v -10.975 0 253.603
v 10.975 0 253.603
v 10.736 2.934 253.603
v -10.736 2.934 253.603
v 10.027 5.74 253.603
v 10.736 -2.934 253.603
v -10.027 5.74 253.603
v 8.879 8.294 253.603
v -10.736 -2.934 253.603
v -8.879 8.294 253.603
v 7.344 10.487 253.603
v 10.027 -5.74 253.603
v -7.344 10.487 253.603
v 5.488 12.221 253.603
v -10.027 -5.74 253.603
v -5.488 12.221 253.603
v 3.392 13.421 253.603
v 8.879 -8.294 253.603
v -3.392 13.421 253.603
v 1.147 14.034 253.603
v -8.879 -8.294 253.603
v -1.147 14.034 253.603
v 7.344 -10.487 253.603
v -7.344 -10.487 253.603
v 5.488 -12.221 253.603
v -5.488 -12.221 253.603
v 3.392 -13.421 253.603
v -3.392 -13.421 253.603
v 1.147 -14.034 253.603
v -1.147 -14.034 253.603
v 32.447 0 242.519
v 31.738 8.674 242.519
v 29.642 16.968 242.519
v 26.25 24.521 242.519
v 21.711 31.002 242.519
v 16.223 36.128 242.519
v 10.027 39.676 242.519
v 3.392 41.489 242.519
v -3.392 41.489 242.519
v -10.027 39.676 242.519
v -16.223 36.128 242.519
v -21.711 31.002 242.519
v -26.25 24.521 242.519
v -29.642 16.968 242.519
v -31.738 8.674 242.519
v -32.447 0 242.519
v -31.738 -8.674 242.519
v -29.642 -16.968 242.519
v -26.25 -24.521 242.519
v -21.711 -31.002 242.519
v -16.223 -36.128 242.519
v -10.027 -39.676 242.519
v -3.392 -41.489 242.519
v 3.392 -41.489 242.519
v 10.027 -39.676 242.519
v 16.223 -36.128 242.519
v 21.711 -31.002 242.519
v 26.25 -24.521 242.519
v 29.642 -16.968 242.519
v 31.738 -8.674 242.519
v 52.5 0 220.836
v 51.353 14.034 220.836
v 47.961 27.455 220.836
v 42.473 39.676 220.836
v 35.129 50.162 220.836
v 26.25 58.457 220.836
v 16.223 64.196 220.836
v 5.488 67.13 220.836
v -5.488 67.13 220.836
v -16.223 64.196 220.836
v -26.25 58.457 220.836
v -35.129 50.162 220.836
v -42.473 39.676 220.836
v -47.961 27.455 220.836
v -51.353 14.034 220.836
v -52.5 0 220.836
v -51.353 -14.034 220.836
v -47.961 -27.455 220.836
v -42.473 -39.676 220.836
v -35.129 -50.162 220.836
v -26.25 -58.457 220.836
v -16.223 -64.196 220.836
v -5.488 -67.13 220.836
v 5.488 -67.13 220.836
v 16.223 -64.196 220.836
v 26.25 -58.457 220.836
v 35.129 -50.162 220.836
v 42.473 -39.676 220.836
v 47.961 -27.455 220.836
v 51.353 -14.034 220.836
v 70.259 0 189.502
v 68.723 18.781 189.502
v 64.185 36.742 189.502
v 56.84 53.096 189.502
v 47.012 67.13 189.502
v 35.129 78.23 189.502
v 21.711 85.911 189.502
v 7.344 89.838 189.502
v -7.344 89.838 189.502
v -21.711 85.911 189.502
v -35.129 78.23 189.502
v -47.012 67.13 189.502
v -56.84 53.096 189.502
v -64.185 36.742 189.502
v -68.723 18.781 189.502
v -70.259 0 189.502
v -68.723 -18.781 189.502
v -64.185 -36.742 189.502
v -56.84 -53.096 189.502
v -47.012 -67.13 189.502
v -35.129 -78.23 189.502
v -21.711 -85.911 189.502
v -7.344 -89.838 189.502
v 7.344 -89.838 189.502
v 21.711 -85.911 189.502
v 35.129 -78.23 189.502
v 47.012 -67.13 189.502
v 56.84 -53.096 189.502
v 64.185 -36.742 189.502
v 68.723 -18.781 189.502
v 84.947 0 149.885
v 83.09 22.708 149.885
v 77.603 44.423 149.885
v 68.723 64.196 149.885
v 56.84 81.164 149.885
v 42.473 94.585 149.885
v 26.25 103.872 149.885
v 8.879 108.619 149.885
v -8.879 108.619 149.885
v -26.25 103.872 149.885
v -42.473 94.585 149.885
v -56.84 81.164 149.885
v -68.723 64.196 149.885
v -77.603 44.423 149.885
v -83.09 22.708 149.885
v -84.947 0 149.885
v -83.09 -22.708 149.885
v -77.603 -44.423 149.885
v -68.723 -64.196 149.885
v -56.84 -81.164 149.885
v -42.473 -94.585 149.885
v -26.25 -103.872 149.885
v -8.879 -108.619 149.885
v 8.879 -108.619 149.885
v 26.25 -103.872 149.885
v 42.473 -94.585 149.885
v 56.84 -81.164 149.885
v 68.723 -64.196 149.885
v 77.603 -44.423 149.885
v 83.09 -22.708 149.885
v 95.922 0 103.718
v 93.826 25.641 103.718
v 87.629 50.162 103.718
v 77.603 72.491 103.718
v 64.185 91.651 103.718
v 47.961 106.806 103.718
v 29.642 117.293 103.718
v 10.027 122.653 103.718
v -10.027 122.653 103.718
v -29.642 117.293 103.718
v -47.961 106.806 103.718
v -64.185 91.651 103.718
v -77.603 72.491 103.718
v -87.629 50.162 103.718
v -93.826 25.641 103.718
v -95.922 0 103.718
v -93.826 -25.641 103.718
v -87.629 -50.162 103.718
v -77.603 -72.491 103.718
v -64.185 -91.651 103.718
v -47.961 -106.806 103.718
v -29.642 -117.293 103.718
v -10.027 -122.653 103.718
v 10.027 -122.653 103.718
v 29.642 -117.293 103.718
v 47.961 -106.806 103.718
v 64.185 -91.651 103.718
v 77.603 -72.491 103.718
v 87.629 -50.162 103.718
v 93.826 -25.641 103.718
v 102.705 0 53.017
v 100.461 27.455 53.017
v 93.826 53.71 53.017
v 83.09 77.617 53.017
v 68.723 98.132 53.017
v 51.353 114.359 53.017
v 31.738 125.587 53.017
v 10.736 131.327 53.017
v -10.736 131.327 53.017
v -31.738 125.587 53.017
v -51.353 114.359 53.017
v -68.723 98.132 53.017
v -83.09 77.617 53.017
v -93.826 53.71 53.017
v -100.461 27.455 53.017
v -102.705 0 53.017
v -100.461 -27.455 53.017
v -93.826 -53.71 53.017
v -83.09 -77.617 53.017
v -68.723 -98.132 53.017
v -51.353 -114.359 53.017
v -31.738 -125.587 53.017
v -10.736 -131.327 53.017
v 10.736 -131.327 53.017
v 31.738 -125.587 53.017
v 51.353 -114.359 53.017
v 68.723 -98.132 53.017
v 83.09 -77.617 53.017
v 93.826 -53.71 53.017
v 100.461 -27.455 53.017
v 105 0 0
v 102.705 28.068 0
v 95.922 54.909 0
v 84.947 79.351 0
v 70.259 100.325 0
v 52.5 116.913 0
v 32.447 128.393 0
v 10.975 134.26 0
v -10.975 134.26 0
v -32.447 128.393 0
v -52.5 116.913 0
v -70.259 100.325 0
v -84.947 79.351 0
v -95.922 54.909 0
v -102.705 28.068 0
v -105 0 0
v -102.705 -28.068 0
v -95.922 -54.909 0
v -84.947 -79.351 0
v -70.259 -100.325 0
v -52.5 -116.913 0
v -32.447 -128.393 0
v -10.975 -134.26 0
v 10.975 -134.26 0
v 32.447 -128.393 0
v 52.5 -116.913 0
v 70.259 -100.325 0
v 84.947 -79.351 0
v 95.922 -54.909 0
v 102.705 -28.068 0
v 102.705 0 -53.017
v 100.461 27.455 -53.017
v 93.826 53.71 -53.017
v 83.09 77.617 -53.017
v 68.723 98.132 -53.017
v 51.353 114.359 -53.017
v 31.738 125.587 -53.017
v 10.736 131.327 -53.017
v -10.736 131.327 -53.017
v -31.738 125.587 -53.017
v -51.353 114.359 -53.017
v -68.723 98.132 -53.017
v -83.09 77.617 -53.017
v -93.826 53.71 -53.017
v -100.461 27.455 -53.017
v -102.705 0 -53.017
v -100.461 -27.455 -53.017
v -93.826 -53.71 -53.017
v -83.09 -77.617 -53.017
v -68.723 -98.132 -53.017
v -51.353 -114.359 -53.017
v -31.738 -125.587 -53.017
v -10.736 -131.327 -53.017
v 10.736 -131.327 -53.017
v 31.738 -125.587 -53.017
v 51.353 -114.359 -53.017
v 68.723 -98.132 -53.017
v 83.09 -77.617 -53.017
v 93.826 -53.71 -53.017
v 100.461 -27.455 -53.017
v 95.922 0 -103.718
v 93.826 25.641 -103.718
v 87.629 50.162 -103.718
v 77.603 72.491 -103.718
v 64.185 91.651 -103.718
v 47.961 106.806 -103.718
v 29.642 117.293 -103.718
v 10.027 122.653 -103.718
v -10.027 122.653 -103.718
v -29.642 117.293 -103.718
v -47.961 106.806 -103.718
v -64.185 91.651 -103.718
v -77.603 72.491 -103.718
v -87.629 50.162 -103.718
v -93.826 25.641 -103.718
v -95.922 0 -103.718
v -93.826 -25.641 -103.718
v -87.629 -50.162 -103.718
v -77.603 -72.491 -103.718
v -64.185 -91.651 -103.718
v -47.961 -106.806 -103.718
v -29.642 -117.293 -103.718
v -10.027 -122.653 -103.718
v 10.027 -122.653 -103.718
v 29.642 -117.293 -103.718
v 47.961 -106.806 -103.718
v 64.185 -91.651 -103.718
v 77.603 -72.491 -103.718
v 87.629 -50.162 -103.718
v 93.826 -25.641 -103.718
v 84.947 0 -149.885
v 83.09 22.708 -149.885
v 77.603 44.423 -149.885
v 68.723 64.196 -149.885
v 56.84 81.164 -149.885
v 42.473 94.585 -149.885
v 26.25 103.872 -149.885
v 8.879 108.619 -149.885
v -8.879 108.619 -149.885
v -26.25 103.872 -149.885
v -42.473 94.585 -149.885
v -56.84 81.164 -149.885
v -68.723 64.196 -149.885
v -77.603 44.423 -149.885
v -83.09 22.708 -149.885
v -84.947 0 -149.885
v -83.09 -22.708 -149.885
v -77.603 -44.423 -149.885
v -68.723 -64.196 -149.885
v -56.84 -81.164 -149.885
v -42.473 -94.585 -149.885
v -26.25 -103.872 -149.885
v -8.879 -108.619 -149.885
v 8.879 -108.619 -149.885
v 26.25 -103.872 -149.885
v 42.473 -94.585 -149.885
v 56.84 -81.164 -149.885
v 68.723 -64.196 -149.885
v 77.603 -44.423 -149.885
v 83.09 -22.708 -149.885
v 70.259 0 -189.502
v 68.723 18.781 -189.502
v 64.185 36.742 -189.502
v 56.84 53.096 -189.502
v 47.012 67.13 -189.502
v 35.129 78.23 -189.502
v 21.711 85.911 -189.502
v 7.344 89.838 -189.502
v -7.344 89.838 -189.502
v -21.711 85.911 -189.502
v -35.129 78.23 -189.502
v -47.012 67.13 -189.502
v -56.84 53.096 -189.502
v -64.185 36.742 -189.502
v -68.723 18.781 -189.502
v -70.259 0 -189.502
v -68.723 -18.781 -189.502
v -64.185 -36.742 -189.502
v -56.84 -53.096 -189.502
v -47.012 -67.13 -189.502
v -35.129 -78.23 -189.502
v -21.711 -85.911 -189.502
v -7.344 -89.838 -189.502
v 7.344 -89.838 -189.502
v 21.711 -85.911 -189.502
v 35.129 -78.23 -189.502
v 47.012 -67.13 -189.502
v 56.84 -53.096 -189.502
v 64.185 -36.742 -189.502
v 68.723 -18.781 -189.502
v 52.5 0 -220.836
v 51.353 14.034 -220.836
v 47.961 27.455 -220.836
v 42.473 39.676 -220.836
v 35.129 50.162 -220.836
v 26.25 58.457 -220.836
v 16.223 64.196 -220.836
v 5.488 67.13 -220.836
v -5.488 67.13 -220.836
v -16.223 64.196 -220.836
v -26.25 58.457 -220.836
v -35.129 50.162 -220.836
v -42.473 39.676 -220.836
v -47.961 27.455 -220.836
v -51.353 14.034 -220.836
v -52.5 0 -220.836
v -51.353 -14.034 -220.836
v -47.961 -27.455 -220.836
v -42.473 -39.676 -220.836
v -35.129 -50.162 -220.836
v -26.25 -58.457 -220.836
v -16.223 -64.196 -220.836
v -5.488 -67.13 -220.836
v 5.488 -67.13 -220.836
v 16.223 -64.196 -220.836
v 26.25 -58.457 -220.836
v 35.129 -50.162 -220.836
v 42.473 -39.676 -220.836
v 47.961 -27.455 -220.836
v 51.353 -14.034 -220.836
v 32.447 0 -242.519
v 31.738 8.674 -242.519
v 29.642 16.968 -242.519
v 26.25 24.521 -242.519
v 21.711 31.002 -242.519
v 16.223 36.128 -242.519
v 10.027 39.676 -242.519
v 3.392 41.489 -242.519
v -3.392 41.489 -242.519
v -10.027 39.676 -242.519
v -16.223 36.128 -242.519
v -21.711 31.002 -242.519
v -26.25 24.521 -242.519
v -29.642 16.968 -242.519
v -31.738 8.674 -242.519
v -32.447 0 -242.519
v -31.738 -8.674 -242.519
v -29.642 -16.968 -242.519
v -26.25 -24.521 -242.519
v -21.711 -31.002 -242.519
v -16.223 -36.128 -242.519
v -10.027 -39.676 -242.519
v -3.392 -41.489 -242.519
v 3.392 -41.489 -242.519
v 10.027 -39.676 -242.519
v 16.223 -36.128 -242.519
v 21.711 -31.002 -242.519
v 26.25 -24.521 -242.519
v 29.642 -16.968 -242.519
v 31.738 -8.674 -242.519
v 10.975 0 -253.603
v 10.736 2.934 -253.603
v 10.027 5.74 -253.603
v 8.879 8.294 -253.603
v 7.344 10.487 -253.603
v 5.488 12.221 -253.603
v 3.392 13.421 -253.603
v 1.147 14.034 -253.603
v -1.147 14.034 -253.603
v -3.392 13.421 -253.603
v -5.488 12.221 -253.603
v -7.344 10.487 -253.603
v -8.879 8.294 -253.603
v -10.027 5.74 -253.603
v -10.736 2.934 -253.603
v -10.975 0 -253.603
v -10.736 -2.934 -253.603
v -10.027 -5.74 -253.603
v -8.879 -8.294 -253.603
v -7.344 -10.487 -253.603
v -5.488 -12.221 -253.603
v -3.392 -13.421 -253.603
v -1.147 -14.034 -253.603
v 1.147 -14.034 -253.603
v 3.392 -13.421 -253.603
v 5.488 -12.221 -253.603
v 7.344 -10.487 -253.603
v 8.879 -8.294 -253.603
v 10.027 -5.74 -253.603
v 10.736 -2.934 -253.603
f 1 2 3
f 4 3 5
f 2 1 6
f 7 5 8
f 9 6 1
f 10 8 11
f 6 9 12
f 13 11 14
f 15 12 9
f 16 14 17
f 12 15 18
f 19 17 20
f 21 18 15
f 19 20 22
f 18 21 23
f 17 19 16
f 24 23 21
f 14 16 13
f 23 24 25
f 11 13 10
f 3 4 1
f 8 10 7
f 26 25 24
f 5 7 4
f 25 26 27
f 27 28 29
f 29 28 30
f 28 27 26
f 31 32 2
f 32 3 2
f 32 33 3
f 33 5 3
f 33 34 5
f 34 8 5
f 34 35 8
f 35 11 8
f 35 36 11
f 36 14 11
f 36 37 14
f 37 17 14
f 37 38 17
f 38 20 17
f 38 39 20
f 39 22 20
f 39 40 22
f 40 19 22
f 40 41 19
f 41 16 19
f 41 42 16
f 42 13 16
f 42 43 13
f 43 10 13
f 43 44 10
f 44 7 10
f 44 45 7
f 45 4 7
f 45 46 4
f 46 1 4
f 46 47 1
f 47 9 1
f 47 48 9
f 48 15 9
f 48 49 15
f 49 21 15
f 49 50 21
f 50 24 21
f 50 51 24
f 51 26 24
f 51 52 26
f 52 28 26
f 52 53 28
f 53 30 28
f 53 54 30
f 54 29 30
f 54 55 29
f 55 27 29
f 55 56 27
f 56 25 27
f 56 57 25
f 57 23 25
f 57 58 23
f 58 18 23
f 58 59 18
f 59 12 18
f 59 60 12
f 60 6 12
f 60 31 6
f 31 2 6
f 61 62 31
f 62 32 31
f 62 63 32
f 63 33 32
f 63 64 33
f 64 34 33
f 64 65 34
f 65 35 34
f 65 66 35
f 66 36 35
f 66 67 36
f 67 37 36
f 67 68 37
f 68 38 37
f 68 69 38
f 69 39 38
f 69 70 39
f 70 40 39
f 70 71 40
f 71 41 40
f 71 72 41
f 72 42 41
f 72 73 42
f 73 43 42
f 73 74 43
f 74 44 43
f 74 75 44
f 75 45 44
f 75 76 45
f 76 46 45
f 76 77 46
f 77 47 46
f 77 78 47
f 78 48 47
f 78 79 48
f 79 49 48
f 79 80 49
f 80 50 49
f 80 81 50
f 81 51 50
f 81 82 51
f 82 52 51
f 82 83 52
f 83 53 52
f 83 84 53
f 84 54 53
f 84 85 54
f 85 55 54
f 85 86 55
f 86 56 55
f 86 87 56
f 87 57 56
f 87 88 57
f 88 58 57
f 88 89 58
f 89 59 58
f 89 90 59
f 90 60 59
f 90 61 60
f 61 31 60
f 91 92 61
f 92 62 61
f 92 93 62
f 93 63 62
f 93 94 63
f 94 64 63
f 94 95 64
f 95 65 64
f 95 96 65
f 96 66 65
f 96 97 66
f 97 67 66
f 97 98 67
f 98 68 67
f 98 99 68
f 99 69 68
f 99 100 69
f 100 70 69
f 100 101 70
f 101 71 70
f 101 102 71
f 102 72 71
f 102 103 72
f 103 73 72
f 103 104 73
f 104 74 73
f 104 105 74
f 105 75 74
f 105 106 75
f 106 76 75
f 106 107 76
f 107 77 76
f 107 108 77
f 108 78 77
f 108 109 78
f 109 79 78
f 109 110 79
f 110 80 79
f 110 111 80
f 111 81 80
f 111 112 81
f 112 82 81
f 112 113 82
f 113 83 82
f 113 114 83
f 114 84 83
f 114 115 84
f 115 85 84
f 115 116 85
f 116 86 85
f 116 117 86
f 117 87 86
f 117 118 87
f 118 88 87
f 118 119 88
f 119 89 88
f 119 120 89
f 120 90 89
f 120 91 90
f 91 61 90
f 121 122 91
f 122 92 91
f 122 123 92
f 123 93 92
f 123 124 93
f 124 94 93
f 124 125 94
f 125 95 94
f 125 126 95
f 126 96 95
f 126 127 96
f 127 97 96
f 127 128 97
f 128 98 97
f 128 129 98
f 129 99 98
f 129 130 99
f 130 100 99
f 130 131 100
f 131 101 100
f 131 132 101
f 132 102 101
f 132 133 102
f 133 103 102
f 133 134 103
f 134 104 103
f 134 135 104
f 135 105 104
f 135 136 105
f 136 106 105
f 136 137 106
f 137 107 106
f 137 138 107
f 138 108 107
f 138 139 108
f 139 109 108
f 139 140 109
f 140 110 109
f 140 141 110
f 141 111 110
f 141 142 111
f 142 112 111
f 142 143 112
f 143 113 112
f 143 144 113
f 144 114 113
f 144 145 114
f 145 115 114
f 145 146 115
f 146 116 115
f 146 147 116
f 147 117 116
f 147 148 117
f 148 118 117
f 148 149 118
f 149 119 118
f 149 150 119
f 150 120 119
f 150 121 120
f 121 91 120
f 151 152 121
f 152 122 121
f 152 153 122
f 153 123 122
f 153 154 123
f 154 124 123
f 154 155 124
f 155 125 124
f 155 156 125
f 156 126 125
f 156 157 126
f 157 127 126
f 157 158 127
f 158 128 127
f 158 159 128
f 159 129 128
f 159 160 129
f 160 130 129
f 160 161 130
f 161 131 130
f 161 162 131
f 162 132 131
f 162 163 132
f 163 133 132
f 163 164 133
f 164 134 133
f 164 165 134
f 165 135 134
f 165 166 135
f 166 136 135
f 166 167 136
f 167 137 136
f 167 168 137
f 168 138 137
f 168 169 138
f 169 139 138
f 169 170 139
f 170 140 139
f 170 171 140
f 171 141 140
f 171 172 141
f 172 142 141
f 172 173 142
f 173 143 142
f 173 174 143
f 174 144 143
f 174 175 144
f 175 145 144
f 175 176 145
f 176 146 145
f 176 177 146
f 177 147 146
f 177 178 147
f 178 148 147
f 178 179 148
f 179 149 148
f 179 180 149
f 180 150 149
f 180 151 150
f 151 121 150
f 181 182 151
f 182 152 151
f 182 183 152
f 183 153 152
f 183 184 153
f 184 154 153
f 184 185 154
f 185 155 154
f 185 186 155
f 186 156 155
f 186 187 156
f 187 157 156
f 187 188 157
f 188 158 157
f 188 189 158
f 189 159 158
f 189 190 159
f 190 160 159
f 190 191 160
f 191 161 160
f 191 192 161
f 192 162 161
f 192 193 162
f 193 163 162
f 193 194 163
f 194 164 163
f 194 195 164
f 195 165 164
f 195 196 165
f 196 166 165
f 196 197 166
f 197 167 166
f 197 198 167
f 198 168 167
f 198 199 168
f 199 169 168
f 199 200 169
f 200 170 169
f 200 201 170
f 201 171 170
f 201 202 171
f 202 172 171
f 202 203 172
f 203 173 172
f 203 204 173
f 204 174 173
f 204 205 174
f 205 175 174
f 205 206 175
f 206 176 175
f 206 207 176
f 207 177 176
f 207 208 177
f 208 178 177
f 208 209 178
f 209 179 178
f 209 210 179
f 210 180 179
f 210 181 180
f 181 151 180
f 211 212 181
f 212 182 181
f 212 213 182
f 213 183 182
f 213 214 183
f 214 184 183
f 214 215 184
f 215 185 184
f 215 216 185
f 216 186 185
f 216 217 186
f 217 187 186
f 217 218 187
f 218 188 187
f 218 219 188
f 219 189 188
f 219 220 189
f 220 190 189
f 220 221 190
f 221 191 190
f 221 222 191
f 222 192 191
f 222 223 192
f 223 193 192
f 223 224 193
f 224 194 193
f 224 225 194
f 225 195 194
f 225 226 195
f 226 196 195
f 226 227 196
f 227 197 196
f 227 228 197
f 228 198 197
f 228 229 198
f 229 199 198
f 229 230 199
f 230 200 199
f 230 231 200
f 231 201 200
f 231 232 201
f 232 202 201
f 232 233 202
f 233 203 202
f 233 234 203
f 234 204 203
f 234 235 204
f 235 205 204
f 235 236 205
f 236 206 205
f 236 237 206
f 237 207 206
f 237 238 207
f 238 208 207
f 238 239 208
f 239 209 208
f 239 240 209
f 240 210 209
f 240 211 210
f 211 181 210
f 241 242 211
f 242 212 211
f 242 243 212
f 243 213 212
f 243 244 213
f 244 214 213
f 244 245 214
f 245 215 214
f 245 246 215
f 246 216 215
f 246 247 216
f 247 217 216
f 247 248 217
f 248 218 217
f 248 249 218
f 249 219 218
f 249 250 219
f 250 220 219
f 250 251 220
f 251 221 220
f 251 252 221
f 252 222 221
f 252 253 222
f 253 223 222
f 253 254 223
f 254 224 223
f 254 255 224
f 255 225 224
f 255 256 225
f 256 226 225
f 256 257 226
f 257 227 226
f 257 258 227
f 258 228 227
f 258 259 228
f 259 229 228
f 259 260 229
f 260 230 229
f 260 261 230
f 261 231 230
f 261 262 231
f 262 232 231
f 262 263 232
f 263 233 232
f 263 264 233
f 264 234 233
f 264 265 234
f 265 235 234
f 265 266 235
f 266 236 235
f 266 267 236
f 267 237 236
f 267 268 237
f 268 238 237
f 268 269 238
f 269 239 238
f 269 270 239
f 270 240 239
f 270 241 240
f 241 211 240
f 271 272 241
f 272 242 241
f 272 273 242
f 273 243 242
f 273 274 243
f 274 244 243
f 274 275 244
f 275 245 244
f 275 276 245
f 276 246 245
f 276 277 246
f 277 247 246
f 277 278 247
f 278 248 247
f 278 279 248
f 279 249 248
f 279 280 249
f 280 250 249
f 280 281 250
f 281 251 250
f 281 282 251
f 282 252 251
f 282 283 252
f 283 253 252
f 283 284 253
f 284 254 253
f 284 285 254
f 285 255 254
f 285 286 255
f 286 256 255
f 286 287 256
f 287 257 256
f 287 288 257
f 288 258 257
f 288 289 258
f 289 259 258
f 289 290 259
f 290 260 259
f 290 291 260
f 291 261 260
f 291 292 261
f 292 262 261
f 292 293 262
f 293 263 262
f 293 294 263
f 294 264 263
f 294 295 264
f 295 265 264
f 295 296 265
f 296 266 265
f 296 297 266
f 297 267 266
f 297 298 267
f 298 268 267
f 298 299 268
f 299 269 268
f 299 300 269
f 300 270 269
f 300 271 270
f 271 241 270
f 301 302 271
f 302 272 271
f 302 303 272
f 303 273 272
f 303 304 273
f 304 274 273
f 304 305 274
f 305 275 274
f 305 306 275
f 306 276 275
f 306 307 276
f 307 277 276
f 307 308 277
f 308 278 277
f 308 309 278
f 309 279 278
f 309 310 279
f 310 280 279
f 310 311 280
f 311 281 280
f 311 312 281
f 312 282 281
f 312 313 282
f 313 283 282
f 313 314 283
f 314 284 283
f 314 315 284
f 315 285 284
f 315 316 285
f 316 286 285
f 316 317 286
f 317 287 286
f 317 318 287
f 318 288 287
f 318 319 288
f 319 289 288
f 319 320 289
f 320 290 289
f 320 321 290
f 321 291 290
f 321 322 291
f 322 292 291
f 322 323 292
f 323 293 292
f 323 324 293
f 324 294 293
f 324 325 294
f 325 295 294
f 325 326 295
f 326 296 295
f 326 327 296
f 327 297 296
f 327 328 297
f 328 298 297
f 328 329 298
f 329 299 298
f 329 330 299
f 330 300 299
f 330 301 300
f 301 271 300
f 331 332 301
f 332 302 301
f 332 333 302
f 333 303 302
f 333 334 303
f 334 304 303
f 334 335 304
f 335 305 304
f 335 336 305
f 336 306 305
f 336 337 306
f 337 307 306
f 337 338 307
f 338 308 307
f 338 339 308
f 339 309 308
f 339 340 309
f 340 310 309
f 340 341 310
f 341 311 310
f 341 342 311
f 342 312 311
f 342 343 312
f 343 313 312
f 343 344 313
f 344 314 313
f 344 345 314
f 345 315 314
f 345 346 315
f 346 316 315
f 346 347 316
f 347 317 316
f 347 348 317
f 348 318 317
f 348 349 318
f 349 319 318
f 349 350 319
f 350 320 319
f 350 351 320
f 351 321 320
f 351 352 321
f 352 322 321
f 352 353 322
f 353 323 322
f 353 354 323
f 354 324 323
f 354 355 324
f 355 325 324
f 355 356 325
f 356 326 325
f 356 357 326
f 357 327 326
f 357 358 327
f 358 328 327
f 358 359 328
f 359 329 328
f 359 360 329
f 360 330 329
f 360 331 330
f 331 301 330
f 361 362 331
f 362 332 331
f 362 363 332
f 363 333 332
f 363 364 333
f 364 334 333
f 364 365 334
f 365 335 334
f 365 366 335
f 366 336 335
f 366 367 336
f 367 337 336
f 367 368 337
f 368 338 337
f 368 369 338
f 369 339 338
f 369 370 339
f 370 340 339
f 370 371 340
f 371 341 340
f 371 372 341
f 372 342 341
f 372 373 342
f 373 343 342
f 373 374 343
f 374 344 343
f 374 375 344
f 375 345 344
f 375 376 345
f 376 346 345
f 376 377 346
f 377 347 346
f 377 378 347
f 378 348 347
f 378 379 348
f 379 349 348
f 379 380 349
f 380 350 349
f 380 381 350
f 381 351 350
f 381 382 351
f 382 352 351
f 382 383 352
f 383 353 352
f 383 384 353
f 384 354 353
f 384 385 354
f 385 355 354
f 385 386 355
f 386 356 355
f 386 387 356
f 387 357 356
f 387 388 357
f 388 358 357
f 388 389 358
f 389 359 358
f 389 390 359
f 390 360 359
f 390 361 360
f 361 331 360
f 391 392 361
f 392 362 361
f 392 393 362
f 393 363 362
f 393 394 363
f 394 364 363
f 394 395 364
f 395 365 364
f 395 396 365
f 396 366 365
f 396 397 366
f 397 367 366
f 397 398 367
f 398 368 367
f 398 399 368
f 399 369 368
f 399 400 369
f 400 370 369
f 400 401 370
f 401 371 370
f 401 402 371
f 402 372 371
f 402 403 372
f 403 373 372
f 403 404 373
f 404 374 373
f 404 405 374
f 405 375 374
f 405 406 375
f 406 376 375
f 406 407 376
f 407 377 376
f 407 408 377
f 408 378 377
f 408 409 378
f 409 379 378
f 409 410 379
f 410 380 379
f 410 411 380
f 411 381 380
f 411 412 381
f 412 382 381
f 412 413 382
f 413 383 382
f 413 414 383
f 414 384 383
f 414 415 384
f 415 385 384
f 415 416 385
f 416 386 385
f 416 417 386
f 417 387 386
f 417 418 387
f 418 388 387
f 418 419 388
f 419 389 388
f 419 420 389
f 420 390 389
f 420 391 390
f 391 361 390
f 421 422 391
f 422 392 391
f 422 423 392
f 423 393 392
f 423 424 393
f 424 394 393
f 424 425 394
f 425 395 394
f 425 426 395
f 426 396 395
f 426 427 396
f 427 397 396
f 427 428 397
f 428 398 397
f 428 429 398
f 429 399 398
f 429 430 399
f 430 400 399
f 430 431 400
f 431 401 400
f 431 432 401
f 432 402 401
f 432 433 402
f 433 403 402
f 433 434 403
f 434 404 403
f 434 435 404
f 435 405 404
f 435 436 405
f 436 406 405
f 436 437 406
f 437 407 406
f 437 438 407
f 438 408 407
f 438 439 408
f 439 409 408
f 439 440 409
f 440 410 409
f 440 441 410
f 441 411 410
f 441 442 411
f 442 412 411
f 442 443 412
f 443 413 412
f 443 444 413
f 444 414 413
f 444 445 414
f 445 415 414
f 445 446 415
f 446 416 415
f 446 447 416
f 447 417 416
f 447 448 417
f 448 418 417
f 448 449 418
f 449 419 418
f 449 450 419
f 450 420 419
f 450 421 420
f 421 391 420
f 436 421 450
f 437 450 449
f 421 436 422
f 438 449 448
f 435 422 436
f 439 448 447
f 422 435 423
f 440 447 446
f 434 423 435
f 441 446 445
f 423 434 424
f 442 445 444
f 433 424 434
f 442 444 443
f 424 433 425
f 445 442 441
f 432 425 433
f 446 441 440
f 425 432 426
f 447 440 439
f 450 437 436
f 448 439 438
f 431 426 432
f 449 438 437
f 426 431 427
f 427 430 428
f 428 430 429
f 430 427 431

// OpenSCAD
// Generated by SolidPython 1.0.1 on 2020-07-29 00:46:47


scale(v = [7, 9, 17]) {
	sphere(r = 15);
}
/***********************************************
*********      SolidPython code:      **********
************************************************
 
# import packages: SolidPython
from solid import *
from solid.utils import *
from itertools import chain, combinations, permutations


class Resize:

    def __init__(self, scad_file):
        self.scad_file = scad_file
        #self.scad_file = import_scad(scad_file)
        # cone/cylinder param:
        self.r1 = 0
        self.r2 = 0
        self.h = 0
        # rectangular prism param:
        self.w = 0
        self.l = 0
        # ellipse param:
        self.r = 0

    # import OpenScad code (file name corresponds to shape)


    # classify shape + parameters
    def assign(self, param1, param2, param3):
        if self.scad_file == 'cone.scad':
            self.r1 = param1
            self.r2 = param2
            self.h = param3
        elif self.scad_file == 'cylinder.scad':
            self.r1 = param1
            self.r2 = param2
            self.h = param3
        elif self.scad_file == 'rectangularPrism.scad':
            self.h = param1
            self.l = param2
            self.w = param3
        else:
            self.r = param1
            self.h = param2

    # resize parameters
    def iterate(self):
        x = range(3, 20, 2)
        i = 1
        if self.scad_file == 'cone.scad':
            tempList = list(permutations(x, 2))
            for temp in tempList:
                param1 = temp[0]
                param2 = temp[1]
                filepath = 'produced_scad_files/' + 'cone' + str(param1) + '_' + str(param2) + '_' + '.scad'
                scad_render_to_file(cylinder(h=param1, r1=param2, r2=0), filepath)

        elif self.scad_file == 'cylinder.scad':
            tempList = list(permutations(x, 3))
            for temp in tempList:
                param1 = temp[0]
                param2 = temp[1]
                filepath = 'produced_scad_files/' + 'cylinder' + str(param1) + '_' + str(param2) + '_' + '.scad'
                scad_render_to_file(cylinder(h=param1, r1=param2, r2=param2), filepath)

        elif self.scad_file == 'rectangularPrism.scad':
            tempList = list(permutations(x, 3))
            for temp in tempList:
                param1 = temp[0]
                param2 = temp[1]
                param3 = temp[2]
                filepath = 'produced_scad_files/' + 'rectangularPrism' + str(param1) + '_' + str(param2) + '_' + str(
                    param3) + '.scad'
                scad_render_to_file(cube(size=(param1, param2, param3)), filepath)

        elif self.scad_file == 'ellipse.scad':
            tempList = list(permutations(x, 4))
            for temp in tempList:
                param1 = temp[0]
                param2 = temp[1]
                param3 = temp[2]
                param4 = temp[3]
                filepath = 'produced_scad_files/' + 'ellipse' + str(param1) + '_' + str(param2) + '_' + str(param3) + '_' + str(param4) + '.scad'
                scad_render_to_file(scale([param1, param2, param3])(sphere(r=param4)), filepath)

    def render_to_scadfile(self):
        scad_render_to_file(scad, 'example.scad') 
 
************************************************/
